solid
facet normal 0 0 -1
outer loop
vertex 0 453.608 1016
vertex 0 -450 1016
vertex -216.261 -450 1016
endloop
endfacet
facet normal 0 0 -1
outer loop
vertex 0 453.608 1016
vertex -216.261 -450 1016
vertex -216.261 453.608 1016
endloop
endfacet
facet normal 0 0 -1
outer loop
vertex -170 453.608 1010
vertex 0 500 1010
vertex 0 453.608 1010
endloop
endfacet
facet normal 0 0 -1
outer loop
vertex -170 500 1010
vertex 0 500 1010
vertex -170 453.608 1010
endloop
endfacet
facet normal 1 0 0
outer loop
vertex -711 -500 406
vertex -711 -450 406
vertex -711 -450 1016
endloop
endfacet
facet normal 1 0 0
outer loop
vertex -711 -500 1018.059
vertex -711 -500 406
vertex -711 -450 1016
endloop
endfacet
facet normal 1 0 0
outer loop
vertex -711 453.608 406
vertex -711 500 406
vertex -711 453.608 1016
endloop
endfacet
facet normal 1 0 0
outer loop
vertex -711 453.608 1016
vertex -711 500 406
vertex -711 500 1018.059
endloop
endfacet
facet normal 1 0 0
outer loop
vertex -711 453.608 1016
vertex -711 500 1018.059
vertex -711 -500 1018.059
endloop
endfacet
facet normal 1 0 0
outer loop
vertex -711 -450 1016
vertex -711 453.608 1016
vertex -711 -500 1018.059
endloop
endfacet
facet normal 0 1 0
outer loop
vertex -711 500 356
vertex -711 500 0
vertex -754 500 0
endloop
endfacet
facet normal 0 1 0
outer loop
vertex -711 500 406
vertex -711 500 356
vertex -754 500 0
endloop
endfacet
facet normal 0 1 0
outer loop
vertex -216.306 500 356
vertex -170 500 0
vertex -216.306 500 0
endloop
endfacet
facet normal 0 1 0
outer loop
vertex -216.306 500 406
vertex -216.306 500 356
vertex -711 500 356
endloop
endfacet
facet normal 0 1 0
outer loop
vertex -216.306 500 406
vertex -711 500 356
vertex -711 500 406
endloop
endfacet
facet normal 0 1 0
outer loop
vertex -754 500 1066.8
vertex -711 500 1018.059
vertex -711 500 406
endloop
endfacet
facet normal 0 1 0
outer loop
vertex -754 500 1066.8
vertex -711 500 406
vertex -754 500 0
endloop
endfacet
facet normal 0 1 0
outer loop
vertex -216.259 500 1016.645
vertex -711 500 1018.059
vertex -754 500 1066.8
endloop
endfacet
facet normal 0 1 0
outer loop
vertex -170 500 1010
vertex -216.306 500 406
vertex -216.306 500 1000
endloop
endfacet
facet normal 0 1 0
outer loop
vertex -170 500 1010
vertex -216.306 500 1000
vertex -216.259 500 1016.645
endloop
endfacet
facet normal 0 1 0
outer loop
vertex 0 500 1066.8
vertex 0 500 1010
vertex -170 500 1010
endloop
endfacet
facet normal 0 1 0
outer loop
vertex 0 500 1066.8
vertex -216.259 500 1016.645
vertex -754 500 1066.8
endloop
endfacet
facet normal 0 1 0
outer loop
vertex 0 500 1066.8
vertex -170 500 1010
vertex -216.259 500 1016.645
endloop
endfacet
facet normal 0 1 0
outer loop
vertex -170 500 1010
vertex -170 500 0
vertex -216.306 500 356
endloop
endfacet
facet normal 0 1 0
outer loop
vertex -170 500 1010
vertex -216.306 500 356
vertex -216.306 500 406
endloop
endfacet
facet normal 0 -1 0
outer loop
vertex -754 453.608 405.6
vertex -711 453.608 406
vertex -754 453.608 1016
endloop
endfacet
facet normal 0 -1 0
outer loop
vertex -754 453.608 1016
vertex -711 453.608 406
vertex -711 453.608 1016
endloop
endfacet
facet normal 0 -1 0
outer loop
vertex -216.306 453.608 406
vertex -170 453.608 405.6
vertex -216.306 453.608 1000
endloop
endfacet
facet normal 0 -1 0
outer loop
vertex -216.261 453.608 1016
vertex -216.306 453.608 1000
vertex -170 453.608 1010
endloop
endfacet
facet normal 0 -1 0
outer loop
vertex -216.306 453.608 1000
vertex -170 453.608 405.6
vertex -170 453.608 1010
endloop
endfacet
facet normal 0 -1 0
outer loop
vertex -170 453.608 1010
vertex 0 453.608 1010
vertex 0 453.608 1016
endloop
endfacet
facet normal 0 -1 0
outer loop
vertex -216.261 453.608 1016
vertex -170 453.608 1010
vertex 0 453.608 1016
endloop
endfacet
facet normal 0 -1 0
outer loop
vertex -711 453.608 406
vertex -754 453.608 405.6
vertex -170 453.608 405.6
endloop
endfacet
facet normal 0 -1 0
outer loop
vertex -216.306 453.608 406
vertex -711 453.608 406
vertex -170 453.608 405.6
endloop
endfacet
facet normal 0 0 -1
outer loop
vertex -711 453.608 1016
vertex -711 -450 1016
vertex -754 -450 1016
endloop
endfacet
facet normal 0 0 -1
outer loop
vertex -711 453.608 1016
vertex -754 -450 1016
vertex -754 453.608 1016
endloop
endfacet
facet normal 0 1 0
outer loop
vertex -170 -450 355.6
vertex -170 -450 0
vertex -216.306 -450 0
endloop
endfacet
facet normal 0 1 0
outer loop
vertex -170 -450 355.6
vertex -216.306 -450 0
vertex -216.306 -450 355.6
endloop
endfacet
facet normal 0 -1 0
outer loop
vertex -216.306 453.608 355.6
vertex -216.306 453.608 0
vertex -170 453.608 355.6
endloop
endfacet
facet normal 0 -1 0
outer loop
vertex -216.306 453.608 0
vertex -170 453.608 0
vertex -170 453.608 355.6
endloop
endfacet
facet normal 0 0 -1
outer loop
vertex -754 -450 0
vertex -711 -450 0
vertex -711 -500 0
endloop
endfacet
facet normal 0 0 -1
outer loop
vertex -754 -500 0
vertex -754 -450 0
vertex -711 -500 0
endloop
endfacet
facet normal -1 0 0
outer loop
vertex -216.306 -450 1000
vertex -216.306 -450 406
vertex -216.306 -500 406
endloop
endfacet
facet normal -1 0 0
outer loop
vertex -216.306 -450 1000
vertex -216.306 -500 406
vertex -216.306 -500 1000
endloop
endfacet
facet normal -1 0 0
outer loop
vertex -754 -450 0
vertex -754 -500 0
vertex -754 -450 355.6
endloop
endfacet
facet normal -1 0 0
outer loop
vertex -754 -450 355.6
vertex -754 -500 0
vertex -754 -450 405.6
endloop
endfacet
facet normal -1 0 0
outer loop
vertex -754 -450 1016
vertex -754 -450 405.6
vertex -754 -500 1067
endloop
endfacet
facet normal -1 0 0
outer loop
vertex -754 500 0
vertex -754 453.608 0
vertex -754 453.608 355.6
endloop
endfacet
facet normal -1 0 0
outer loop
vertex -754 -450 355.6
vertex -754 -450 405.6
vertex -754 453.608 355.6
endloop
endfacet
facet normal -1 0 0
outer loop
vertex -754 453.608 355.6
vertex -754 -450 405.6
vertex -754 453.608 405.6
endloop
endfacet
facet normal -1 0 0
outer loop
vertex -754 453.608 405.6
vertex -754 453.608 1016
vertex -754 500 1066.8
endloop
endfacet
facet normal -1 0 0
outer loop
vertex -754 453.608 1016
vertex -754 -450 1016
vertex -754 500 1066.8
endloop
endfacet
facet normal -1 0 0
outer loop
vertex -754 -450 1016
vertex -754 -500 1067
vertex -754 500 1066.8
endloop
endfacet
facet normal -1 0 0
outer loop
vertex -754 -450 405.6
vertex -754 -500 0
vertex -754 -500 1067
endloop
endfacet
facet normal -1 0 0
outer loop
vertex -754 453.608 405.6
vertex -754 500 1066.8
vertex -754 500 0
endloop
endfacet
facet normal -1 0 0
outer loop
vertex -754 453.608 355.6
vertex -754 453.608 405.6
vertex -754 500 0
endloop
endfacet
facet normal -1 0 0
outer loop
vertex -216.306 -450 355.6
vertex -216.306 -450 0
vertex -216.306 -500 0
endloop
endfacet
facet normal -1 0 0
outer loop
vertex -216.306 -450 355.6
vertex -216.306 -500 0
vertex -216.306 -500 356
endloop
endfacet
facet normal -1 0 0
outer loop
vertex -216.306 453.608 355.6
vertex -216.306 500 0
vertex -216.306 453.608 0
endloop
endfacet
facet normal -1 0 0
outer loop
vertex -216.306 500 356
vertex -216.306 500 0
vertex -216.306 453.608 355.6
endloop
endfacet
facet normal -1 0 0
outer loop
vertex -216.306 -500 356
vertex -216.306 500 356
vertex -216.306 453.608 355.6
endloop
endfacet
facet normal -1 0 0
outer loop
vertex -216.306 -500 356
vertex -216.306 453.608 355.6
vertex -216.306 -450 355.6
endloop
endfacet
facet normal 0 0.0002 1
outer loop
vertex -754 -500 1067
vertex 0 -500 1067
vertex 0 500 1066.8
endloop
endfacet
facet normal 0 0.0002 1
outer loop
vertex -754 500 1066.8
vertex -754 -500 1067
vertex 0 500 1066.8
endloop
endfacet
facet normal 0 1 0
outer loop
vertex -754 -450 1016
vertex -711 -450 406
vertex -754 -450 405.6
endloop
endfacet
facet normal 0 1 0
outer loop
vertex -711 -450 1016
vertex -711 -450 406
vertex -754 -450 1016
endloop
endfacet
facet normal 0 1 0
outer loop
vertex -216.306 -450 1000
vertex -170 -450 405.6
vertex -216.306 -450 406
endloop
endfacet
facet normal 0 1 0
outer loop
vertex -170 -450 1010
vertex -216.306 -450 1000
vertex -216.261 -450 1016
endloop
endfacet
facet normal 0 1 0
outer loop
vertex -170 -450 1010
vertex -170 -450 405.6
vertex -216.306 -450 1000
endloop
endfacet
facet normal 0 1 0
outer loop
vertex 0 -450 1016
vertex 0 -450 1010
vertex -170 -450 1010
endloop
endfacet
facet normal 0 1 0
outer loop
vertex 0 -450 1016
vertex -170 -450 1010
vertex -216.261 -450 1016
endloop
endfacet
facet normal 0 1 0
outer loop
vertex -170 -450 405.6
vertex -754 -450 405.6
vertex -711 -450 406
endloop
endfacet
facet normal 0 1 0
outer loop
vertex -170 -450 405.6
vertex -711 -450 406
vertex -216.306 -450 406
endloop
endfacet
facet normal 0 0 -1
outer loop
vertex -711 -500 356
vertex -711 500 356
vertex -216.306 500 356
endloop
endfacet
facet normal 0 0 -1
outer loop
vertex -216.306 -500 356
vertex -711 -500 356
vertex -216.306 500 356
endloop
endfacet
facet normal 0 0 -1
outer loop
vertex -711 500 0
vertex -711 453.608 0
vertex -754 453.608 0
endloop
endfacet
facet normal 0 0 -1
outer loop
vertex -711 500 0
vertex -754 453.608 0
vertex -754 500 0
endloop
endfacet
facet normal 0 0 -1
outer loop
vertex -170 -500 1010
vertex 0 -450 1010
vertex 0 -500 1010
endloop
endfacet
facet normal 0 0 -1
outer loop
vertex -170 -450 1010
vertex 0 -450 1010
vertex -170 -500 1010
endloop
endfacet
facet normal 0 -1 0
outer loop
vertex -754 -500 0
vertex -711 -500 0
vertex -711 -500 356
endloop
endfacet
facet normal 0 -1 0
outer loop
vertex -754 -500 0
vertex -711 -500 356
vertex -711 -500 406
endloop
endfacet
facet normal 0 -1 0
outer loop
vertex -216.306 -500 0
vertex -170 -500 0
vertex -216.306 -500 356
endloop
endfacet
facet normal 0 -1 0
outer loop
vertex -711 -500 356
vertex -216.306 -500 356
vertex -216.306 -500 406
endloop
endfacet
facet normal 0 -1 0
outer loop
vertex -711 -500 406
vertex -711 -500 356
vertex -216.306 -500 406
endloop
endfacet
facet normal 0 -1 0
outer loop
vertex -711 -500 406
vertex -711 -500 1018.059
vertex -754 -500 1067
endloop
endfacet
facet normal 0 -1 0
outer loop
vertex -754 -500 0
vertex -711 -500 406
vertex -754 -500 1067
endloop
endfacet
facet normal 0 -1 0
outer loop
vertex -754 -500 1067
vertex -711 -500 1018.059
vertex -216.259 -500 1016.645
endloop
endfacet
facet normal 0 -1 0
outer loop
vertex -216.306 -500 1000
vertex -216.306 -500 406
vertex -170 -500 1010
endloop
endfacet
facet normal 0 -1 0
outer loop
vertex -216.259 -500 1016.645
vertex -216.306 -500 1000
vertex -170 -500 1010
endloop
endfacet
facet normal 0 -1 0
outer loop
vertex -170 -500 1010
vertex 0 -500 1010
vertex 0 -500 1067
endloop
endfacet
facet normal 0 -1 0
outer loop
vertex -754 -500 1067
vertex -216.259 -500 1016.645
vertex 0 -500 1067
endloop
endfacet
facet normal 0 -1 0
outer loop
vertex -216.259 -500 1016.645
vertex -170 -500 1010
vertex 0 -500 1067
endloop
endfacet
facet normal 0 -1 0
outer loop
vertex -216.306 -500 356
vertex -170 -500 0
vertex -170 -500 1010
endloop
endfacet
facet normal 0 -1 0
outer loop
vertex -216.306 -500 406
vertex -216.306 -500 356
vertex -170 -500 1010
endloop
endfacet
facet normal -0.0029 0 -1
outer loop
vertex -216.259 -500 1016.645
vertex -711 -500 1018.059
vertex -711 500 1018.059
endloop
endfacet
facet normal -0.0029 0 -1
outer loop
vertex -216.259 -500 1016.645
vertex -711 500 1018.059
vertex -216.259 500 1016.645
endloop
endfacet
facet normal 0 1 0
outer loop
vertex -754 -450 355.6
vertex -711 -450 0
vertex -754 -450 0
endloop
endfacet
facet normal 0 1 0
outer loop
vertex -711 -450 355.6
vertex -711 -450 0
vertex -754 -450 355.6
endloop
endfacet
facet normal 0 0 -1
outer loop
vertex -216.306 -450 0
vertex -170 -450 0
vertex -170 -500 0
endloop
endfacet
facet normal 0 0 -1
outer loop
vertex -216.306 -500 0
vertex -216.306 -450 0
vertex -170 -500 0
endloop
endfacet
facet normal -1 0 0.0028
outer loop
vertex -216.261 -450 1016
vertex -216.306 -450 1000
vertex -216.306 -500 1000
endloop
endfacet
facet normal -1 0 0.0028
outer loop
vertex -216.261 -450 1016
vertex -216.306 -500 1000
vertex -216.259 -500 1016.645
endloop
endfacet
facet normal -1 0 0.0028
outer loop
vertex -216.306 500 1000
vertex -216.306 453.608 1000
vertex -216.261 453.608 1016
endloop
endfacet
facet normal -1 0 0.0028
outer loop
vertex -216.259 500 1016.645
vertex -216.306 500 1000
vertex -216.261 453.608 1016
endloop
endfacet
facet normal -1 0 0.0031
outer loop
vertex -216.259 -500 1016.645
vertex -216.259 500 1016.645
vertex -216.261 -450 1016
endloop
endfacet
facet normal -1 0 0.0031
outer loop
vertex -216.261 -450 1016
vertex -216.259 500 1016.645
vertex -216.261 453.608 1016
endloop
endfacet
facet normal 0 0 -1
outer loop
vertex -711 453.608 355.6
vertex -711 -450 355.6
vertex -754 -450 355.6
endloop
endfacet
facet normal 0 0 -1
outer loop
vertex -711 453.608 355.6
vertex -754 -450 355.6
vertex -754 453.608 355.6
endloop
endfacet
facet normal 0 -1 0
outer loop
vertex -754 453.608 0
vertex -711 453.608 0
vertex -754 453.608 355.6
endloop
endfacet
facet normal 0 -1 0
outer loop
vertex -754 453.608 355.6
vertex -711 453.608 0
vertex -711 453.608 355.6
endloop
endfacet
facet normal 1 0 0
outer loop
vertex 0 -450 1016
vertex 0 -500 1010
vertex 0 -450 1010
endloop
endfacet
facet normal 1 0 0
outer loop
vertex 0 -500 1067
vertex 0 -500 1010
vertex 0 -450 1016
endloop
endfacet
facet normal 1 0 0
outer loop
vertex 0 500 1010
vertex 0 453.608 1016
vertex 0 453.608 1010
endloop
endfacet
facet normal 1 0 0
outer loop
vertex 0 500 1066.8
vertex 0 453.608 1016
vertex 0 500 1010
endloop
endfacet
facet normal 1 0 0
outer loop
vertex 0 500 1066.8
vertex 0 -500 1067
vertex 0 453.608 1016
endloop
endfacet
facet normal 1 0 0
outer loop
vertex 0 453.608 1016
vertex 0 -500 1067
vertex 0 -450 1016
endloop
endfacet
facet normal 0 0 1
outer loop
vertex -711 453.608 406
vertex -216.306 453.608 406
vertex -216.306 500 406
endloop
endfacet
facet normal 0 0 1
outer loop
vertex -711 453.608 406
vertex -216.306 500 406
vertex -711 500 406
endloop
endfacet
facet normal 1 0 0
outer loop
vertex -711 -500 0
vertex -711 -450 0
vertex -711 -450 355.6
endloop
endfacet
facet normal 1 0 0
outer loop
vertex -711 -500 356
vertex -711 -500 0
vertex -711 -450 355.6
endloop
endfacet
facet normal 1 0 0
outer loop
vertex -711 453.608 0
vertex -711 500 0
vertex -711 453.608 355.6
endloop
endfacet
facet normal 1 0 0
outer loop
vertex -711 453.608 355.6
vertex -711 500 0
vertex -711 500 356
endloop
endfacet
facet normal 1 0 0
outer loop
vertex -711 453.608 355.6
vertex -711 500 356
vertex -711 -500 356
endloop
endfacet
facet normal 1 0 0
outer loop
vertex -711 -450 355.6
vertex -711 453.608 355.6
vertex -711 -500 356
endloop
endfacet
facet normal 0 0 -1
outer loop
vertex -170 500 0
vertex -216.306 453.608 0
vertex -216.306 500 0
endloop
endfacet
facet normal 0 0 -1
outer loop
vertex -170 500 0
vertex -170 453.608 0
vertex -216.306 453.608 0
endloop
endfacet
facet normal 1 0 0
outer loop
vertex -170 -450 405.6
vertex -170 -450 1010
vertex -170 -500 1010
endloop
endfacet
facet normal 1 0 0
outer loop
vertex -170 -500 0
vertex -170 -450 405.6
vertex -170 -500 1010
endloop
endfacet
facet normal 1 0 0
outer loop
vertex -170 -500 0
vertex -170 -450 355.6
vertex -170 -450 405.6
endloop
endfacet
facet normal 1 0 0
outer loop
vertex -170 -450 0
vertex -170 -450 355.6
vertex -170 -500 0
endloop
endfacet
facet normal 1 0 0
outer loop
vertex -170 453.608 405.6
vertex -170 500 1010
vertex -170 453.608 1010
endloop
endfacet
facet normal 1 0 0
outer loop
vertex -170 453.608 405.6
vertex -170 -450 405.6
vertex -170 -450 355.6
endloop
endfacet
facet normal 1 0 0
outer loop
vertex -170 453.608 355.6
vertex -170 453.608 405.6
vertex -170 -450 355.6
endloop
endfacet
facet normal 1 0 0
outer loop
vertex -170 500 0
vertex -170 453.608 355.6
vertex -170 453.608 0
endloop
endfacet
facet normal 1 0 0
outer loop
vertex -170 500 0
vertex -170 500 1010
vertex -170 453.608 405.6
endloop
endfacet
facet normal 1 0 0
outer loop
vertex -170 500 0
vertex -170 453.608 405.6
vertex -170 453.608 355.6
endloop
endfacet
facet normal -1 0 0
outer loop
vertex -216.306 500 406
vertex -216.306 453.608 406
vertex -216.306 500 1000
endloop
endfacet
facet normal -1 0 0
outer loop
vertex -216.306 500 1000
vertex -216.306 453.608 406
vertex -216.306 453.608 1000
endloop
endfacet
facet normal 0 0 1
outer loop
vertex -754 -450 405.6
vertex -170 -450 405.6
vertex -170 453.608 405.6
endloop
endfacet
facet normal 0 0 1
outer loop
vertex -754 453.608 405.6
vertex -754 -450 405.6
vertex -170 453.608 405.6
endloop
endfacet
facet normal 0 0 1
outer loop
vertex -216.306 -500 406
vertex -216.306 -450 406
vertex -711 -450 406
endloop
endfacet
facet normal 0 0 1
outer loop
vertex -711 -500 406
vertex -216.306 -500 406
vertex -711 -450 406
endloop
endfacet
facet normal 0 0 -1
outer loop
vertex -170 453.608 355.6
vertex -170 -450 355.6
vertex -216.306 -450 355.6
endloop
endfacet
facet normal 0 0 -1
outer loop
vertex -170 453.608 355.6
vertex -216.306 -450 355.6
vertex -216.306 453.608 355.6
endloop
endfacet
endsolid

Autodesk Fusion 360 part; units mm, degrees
sketch "FrontProfile" plane through (0, 0, 0) normal (1, 0, 0) x (0, 1, 0)
  line L0 (0, 0) -> (-450, 0)
  line L1 (0, 0) -> (450, 0)
  line L2 (-450, 0) -> (-500, 0)
  line L3 (450, 0) -> (500, 0)
  line L4 (-500, 0) -> (-500, 1067)
  line L5 (500, 0) -> (500, 1066.8)
  line L6 (453.6078, 0) -> (453.6078, 1016)
  line L7 (-450, 0) -> (-450, 1016)
  line L8 (-450, 355.6) -> (453.6078, 355.6)
  line L9 (-450, 405.6) -> (453.6078, 405.6)
  line L10 (-450, 1016) -> (453.6078, 1016)
  line L11 (-500, 1067) -> (500, 1066.8)
sketch "Sketch3" plane through (0, 0, 0) normal (0, 1, 0) x (1, 0, 0)
  line L0 (0, 0) -> (-165.5064, 0)
  line L1 (-165.5064, 0) -> (-165.5064, -1016.5)
  line L2 (0, -1100) -> (-762, -1100)
  line L3 (-165.5064, 0) -> (-216.3064, 0)
  line L4 (-216.3064, 0) -> (-216.3064, -1000)
  line L5 (-762, -1100) -> (-762, 0)
  line L6 (-762, 0) -> (-711, 0)
  line L7 (-711, 0) -> (-711, -1018.0594)
  line L8 (-711, -1018.0594) -> (-165.5064, -1016.5)
  line L9 (-216.3064, -1000) -> (-216.2588, -1016.6451)
  line L10 (0, -1100) -> (0, 0)
  line L11 (-711, -356) -> (-216.3064, -356)
  line L12 (-711, 0) -> (-216.3064, 0)
  line L13 (-216.3064, -406) -> (-711, -406)
sketch "Sketch4" plane through (0, 0, 0) normal (0, 0, 1) x (1, 0, 0)
  line L0 (0, 0) -> (-762, 0)
  line L1 (0, 0) -> (0, 473.2266)
  line L2 (0, 0) -> (0, 422)
  line L3 (0, 0) -> (0, -422)
  line L4 (0, -422) -> (-750.4023, -422)
  line L5 (-750.4023, -422) -> (-762, 0)
  line L6 (0, 473.2266) -> (-750.4023, 473.2266)
  line L7 (-750.4023, 473.2266) -> (-762, 0)
  line L8 (-762, 0) -> (-762, 473.2266)
  line L9 (-762, 473.2266) -> (-750.4023, 473.2266)
  line L10 (-762, 0) -> (-762, -420)
  line L11 (-762, -420) -> (-762, -422)
  line L12 (-762, -422) -> (-697, -422)
extrude "Extrude1" add sketch "FrontProfile" against normal blind 754 contours L2 L3 L4 L5 L6 L7 L10 L11
extrude "Extrude2" add sketch "FrontProfile" against normal blind 754 contours L6 L7 L8 L9
sketch "Sketch5" plane through (0, 0, 0) normal (0, 1, 0) x (1, 0, 0)
  line L0 (-170, -1010) -> (0, -1010)
  line L1 (-170, -1010) -> (-170, 0)
sketch "Sketch6" plane through (0, 500, 0) normal (0, 1, 0) x (-1, 0, 0)
  line L0 (0, 1066.8) -> (0, 0)
  line L1 (0, 0) -> (754, 0)
  line L2 (754, 0) -> (754, 1066.8)
  line L3 (754, 1066.8) -> (0, 1066.8)
  line L4 (0, 1010) -> (170, 1010)
  line L5 (170, 1010) -> (170, 0)
  line L6 (170, 0) -> (0, 0)
  line L7 (0, 0) -> (0, 1010)
extrude "Extrude3" cut sketch "Sketch6" against normal blind 1000 contours L0 L1 L4 L5 L6 L7
extrude "Extrude4" cut sketch "Sketch3" along normal blind 600 contours L4 L7 L8 L9 L13
extrude "Extrude5" cut sketch "Sketch3" against normal blind 700 contours L4 L7 L8 L9 L13
extrude "Extrude6" cut sketch "Sketch3" against normal blind 650 contours L4 L7 L11 L12
extrude "Extrude7" cut sketch "Sketch3" along normal blind 600 contours L4 L7 L11 L12
